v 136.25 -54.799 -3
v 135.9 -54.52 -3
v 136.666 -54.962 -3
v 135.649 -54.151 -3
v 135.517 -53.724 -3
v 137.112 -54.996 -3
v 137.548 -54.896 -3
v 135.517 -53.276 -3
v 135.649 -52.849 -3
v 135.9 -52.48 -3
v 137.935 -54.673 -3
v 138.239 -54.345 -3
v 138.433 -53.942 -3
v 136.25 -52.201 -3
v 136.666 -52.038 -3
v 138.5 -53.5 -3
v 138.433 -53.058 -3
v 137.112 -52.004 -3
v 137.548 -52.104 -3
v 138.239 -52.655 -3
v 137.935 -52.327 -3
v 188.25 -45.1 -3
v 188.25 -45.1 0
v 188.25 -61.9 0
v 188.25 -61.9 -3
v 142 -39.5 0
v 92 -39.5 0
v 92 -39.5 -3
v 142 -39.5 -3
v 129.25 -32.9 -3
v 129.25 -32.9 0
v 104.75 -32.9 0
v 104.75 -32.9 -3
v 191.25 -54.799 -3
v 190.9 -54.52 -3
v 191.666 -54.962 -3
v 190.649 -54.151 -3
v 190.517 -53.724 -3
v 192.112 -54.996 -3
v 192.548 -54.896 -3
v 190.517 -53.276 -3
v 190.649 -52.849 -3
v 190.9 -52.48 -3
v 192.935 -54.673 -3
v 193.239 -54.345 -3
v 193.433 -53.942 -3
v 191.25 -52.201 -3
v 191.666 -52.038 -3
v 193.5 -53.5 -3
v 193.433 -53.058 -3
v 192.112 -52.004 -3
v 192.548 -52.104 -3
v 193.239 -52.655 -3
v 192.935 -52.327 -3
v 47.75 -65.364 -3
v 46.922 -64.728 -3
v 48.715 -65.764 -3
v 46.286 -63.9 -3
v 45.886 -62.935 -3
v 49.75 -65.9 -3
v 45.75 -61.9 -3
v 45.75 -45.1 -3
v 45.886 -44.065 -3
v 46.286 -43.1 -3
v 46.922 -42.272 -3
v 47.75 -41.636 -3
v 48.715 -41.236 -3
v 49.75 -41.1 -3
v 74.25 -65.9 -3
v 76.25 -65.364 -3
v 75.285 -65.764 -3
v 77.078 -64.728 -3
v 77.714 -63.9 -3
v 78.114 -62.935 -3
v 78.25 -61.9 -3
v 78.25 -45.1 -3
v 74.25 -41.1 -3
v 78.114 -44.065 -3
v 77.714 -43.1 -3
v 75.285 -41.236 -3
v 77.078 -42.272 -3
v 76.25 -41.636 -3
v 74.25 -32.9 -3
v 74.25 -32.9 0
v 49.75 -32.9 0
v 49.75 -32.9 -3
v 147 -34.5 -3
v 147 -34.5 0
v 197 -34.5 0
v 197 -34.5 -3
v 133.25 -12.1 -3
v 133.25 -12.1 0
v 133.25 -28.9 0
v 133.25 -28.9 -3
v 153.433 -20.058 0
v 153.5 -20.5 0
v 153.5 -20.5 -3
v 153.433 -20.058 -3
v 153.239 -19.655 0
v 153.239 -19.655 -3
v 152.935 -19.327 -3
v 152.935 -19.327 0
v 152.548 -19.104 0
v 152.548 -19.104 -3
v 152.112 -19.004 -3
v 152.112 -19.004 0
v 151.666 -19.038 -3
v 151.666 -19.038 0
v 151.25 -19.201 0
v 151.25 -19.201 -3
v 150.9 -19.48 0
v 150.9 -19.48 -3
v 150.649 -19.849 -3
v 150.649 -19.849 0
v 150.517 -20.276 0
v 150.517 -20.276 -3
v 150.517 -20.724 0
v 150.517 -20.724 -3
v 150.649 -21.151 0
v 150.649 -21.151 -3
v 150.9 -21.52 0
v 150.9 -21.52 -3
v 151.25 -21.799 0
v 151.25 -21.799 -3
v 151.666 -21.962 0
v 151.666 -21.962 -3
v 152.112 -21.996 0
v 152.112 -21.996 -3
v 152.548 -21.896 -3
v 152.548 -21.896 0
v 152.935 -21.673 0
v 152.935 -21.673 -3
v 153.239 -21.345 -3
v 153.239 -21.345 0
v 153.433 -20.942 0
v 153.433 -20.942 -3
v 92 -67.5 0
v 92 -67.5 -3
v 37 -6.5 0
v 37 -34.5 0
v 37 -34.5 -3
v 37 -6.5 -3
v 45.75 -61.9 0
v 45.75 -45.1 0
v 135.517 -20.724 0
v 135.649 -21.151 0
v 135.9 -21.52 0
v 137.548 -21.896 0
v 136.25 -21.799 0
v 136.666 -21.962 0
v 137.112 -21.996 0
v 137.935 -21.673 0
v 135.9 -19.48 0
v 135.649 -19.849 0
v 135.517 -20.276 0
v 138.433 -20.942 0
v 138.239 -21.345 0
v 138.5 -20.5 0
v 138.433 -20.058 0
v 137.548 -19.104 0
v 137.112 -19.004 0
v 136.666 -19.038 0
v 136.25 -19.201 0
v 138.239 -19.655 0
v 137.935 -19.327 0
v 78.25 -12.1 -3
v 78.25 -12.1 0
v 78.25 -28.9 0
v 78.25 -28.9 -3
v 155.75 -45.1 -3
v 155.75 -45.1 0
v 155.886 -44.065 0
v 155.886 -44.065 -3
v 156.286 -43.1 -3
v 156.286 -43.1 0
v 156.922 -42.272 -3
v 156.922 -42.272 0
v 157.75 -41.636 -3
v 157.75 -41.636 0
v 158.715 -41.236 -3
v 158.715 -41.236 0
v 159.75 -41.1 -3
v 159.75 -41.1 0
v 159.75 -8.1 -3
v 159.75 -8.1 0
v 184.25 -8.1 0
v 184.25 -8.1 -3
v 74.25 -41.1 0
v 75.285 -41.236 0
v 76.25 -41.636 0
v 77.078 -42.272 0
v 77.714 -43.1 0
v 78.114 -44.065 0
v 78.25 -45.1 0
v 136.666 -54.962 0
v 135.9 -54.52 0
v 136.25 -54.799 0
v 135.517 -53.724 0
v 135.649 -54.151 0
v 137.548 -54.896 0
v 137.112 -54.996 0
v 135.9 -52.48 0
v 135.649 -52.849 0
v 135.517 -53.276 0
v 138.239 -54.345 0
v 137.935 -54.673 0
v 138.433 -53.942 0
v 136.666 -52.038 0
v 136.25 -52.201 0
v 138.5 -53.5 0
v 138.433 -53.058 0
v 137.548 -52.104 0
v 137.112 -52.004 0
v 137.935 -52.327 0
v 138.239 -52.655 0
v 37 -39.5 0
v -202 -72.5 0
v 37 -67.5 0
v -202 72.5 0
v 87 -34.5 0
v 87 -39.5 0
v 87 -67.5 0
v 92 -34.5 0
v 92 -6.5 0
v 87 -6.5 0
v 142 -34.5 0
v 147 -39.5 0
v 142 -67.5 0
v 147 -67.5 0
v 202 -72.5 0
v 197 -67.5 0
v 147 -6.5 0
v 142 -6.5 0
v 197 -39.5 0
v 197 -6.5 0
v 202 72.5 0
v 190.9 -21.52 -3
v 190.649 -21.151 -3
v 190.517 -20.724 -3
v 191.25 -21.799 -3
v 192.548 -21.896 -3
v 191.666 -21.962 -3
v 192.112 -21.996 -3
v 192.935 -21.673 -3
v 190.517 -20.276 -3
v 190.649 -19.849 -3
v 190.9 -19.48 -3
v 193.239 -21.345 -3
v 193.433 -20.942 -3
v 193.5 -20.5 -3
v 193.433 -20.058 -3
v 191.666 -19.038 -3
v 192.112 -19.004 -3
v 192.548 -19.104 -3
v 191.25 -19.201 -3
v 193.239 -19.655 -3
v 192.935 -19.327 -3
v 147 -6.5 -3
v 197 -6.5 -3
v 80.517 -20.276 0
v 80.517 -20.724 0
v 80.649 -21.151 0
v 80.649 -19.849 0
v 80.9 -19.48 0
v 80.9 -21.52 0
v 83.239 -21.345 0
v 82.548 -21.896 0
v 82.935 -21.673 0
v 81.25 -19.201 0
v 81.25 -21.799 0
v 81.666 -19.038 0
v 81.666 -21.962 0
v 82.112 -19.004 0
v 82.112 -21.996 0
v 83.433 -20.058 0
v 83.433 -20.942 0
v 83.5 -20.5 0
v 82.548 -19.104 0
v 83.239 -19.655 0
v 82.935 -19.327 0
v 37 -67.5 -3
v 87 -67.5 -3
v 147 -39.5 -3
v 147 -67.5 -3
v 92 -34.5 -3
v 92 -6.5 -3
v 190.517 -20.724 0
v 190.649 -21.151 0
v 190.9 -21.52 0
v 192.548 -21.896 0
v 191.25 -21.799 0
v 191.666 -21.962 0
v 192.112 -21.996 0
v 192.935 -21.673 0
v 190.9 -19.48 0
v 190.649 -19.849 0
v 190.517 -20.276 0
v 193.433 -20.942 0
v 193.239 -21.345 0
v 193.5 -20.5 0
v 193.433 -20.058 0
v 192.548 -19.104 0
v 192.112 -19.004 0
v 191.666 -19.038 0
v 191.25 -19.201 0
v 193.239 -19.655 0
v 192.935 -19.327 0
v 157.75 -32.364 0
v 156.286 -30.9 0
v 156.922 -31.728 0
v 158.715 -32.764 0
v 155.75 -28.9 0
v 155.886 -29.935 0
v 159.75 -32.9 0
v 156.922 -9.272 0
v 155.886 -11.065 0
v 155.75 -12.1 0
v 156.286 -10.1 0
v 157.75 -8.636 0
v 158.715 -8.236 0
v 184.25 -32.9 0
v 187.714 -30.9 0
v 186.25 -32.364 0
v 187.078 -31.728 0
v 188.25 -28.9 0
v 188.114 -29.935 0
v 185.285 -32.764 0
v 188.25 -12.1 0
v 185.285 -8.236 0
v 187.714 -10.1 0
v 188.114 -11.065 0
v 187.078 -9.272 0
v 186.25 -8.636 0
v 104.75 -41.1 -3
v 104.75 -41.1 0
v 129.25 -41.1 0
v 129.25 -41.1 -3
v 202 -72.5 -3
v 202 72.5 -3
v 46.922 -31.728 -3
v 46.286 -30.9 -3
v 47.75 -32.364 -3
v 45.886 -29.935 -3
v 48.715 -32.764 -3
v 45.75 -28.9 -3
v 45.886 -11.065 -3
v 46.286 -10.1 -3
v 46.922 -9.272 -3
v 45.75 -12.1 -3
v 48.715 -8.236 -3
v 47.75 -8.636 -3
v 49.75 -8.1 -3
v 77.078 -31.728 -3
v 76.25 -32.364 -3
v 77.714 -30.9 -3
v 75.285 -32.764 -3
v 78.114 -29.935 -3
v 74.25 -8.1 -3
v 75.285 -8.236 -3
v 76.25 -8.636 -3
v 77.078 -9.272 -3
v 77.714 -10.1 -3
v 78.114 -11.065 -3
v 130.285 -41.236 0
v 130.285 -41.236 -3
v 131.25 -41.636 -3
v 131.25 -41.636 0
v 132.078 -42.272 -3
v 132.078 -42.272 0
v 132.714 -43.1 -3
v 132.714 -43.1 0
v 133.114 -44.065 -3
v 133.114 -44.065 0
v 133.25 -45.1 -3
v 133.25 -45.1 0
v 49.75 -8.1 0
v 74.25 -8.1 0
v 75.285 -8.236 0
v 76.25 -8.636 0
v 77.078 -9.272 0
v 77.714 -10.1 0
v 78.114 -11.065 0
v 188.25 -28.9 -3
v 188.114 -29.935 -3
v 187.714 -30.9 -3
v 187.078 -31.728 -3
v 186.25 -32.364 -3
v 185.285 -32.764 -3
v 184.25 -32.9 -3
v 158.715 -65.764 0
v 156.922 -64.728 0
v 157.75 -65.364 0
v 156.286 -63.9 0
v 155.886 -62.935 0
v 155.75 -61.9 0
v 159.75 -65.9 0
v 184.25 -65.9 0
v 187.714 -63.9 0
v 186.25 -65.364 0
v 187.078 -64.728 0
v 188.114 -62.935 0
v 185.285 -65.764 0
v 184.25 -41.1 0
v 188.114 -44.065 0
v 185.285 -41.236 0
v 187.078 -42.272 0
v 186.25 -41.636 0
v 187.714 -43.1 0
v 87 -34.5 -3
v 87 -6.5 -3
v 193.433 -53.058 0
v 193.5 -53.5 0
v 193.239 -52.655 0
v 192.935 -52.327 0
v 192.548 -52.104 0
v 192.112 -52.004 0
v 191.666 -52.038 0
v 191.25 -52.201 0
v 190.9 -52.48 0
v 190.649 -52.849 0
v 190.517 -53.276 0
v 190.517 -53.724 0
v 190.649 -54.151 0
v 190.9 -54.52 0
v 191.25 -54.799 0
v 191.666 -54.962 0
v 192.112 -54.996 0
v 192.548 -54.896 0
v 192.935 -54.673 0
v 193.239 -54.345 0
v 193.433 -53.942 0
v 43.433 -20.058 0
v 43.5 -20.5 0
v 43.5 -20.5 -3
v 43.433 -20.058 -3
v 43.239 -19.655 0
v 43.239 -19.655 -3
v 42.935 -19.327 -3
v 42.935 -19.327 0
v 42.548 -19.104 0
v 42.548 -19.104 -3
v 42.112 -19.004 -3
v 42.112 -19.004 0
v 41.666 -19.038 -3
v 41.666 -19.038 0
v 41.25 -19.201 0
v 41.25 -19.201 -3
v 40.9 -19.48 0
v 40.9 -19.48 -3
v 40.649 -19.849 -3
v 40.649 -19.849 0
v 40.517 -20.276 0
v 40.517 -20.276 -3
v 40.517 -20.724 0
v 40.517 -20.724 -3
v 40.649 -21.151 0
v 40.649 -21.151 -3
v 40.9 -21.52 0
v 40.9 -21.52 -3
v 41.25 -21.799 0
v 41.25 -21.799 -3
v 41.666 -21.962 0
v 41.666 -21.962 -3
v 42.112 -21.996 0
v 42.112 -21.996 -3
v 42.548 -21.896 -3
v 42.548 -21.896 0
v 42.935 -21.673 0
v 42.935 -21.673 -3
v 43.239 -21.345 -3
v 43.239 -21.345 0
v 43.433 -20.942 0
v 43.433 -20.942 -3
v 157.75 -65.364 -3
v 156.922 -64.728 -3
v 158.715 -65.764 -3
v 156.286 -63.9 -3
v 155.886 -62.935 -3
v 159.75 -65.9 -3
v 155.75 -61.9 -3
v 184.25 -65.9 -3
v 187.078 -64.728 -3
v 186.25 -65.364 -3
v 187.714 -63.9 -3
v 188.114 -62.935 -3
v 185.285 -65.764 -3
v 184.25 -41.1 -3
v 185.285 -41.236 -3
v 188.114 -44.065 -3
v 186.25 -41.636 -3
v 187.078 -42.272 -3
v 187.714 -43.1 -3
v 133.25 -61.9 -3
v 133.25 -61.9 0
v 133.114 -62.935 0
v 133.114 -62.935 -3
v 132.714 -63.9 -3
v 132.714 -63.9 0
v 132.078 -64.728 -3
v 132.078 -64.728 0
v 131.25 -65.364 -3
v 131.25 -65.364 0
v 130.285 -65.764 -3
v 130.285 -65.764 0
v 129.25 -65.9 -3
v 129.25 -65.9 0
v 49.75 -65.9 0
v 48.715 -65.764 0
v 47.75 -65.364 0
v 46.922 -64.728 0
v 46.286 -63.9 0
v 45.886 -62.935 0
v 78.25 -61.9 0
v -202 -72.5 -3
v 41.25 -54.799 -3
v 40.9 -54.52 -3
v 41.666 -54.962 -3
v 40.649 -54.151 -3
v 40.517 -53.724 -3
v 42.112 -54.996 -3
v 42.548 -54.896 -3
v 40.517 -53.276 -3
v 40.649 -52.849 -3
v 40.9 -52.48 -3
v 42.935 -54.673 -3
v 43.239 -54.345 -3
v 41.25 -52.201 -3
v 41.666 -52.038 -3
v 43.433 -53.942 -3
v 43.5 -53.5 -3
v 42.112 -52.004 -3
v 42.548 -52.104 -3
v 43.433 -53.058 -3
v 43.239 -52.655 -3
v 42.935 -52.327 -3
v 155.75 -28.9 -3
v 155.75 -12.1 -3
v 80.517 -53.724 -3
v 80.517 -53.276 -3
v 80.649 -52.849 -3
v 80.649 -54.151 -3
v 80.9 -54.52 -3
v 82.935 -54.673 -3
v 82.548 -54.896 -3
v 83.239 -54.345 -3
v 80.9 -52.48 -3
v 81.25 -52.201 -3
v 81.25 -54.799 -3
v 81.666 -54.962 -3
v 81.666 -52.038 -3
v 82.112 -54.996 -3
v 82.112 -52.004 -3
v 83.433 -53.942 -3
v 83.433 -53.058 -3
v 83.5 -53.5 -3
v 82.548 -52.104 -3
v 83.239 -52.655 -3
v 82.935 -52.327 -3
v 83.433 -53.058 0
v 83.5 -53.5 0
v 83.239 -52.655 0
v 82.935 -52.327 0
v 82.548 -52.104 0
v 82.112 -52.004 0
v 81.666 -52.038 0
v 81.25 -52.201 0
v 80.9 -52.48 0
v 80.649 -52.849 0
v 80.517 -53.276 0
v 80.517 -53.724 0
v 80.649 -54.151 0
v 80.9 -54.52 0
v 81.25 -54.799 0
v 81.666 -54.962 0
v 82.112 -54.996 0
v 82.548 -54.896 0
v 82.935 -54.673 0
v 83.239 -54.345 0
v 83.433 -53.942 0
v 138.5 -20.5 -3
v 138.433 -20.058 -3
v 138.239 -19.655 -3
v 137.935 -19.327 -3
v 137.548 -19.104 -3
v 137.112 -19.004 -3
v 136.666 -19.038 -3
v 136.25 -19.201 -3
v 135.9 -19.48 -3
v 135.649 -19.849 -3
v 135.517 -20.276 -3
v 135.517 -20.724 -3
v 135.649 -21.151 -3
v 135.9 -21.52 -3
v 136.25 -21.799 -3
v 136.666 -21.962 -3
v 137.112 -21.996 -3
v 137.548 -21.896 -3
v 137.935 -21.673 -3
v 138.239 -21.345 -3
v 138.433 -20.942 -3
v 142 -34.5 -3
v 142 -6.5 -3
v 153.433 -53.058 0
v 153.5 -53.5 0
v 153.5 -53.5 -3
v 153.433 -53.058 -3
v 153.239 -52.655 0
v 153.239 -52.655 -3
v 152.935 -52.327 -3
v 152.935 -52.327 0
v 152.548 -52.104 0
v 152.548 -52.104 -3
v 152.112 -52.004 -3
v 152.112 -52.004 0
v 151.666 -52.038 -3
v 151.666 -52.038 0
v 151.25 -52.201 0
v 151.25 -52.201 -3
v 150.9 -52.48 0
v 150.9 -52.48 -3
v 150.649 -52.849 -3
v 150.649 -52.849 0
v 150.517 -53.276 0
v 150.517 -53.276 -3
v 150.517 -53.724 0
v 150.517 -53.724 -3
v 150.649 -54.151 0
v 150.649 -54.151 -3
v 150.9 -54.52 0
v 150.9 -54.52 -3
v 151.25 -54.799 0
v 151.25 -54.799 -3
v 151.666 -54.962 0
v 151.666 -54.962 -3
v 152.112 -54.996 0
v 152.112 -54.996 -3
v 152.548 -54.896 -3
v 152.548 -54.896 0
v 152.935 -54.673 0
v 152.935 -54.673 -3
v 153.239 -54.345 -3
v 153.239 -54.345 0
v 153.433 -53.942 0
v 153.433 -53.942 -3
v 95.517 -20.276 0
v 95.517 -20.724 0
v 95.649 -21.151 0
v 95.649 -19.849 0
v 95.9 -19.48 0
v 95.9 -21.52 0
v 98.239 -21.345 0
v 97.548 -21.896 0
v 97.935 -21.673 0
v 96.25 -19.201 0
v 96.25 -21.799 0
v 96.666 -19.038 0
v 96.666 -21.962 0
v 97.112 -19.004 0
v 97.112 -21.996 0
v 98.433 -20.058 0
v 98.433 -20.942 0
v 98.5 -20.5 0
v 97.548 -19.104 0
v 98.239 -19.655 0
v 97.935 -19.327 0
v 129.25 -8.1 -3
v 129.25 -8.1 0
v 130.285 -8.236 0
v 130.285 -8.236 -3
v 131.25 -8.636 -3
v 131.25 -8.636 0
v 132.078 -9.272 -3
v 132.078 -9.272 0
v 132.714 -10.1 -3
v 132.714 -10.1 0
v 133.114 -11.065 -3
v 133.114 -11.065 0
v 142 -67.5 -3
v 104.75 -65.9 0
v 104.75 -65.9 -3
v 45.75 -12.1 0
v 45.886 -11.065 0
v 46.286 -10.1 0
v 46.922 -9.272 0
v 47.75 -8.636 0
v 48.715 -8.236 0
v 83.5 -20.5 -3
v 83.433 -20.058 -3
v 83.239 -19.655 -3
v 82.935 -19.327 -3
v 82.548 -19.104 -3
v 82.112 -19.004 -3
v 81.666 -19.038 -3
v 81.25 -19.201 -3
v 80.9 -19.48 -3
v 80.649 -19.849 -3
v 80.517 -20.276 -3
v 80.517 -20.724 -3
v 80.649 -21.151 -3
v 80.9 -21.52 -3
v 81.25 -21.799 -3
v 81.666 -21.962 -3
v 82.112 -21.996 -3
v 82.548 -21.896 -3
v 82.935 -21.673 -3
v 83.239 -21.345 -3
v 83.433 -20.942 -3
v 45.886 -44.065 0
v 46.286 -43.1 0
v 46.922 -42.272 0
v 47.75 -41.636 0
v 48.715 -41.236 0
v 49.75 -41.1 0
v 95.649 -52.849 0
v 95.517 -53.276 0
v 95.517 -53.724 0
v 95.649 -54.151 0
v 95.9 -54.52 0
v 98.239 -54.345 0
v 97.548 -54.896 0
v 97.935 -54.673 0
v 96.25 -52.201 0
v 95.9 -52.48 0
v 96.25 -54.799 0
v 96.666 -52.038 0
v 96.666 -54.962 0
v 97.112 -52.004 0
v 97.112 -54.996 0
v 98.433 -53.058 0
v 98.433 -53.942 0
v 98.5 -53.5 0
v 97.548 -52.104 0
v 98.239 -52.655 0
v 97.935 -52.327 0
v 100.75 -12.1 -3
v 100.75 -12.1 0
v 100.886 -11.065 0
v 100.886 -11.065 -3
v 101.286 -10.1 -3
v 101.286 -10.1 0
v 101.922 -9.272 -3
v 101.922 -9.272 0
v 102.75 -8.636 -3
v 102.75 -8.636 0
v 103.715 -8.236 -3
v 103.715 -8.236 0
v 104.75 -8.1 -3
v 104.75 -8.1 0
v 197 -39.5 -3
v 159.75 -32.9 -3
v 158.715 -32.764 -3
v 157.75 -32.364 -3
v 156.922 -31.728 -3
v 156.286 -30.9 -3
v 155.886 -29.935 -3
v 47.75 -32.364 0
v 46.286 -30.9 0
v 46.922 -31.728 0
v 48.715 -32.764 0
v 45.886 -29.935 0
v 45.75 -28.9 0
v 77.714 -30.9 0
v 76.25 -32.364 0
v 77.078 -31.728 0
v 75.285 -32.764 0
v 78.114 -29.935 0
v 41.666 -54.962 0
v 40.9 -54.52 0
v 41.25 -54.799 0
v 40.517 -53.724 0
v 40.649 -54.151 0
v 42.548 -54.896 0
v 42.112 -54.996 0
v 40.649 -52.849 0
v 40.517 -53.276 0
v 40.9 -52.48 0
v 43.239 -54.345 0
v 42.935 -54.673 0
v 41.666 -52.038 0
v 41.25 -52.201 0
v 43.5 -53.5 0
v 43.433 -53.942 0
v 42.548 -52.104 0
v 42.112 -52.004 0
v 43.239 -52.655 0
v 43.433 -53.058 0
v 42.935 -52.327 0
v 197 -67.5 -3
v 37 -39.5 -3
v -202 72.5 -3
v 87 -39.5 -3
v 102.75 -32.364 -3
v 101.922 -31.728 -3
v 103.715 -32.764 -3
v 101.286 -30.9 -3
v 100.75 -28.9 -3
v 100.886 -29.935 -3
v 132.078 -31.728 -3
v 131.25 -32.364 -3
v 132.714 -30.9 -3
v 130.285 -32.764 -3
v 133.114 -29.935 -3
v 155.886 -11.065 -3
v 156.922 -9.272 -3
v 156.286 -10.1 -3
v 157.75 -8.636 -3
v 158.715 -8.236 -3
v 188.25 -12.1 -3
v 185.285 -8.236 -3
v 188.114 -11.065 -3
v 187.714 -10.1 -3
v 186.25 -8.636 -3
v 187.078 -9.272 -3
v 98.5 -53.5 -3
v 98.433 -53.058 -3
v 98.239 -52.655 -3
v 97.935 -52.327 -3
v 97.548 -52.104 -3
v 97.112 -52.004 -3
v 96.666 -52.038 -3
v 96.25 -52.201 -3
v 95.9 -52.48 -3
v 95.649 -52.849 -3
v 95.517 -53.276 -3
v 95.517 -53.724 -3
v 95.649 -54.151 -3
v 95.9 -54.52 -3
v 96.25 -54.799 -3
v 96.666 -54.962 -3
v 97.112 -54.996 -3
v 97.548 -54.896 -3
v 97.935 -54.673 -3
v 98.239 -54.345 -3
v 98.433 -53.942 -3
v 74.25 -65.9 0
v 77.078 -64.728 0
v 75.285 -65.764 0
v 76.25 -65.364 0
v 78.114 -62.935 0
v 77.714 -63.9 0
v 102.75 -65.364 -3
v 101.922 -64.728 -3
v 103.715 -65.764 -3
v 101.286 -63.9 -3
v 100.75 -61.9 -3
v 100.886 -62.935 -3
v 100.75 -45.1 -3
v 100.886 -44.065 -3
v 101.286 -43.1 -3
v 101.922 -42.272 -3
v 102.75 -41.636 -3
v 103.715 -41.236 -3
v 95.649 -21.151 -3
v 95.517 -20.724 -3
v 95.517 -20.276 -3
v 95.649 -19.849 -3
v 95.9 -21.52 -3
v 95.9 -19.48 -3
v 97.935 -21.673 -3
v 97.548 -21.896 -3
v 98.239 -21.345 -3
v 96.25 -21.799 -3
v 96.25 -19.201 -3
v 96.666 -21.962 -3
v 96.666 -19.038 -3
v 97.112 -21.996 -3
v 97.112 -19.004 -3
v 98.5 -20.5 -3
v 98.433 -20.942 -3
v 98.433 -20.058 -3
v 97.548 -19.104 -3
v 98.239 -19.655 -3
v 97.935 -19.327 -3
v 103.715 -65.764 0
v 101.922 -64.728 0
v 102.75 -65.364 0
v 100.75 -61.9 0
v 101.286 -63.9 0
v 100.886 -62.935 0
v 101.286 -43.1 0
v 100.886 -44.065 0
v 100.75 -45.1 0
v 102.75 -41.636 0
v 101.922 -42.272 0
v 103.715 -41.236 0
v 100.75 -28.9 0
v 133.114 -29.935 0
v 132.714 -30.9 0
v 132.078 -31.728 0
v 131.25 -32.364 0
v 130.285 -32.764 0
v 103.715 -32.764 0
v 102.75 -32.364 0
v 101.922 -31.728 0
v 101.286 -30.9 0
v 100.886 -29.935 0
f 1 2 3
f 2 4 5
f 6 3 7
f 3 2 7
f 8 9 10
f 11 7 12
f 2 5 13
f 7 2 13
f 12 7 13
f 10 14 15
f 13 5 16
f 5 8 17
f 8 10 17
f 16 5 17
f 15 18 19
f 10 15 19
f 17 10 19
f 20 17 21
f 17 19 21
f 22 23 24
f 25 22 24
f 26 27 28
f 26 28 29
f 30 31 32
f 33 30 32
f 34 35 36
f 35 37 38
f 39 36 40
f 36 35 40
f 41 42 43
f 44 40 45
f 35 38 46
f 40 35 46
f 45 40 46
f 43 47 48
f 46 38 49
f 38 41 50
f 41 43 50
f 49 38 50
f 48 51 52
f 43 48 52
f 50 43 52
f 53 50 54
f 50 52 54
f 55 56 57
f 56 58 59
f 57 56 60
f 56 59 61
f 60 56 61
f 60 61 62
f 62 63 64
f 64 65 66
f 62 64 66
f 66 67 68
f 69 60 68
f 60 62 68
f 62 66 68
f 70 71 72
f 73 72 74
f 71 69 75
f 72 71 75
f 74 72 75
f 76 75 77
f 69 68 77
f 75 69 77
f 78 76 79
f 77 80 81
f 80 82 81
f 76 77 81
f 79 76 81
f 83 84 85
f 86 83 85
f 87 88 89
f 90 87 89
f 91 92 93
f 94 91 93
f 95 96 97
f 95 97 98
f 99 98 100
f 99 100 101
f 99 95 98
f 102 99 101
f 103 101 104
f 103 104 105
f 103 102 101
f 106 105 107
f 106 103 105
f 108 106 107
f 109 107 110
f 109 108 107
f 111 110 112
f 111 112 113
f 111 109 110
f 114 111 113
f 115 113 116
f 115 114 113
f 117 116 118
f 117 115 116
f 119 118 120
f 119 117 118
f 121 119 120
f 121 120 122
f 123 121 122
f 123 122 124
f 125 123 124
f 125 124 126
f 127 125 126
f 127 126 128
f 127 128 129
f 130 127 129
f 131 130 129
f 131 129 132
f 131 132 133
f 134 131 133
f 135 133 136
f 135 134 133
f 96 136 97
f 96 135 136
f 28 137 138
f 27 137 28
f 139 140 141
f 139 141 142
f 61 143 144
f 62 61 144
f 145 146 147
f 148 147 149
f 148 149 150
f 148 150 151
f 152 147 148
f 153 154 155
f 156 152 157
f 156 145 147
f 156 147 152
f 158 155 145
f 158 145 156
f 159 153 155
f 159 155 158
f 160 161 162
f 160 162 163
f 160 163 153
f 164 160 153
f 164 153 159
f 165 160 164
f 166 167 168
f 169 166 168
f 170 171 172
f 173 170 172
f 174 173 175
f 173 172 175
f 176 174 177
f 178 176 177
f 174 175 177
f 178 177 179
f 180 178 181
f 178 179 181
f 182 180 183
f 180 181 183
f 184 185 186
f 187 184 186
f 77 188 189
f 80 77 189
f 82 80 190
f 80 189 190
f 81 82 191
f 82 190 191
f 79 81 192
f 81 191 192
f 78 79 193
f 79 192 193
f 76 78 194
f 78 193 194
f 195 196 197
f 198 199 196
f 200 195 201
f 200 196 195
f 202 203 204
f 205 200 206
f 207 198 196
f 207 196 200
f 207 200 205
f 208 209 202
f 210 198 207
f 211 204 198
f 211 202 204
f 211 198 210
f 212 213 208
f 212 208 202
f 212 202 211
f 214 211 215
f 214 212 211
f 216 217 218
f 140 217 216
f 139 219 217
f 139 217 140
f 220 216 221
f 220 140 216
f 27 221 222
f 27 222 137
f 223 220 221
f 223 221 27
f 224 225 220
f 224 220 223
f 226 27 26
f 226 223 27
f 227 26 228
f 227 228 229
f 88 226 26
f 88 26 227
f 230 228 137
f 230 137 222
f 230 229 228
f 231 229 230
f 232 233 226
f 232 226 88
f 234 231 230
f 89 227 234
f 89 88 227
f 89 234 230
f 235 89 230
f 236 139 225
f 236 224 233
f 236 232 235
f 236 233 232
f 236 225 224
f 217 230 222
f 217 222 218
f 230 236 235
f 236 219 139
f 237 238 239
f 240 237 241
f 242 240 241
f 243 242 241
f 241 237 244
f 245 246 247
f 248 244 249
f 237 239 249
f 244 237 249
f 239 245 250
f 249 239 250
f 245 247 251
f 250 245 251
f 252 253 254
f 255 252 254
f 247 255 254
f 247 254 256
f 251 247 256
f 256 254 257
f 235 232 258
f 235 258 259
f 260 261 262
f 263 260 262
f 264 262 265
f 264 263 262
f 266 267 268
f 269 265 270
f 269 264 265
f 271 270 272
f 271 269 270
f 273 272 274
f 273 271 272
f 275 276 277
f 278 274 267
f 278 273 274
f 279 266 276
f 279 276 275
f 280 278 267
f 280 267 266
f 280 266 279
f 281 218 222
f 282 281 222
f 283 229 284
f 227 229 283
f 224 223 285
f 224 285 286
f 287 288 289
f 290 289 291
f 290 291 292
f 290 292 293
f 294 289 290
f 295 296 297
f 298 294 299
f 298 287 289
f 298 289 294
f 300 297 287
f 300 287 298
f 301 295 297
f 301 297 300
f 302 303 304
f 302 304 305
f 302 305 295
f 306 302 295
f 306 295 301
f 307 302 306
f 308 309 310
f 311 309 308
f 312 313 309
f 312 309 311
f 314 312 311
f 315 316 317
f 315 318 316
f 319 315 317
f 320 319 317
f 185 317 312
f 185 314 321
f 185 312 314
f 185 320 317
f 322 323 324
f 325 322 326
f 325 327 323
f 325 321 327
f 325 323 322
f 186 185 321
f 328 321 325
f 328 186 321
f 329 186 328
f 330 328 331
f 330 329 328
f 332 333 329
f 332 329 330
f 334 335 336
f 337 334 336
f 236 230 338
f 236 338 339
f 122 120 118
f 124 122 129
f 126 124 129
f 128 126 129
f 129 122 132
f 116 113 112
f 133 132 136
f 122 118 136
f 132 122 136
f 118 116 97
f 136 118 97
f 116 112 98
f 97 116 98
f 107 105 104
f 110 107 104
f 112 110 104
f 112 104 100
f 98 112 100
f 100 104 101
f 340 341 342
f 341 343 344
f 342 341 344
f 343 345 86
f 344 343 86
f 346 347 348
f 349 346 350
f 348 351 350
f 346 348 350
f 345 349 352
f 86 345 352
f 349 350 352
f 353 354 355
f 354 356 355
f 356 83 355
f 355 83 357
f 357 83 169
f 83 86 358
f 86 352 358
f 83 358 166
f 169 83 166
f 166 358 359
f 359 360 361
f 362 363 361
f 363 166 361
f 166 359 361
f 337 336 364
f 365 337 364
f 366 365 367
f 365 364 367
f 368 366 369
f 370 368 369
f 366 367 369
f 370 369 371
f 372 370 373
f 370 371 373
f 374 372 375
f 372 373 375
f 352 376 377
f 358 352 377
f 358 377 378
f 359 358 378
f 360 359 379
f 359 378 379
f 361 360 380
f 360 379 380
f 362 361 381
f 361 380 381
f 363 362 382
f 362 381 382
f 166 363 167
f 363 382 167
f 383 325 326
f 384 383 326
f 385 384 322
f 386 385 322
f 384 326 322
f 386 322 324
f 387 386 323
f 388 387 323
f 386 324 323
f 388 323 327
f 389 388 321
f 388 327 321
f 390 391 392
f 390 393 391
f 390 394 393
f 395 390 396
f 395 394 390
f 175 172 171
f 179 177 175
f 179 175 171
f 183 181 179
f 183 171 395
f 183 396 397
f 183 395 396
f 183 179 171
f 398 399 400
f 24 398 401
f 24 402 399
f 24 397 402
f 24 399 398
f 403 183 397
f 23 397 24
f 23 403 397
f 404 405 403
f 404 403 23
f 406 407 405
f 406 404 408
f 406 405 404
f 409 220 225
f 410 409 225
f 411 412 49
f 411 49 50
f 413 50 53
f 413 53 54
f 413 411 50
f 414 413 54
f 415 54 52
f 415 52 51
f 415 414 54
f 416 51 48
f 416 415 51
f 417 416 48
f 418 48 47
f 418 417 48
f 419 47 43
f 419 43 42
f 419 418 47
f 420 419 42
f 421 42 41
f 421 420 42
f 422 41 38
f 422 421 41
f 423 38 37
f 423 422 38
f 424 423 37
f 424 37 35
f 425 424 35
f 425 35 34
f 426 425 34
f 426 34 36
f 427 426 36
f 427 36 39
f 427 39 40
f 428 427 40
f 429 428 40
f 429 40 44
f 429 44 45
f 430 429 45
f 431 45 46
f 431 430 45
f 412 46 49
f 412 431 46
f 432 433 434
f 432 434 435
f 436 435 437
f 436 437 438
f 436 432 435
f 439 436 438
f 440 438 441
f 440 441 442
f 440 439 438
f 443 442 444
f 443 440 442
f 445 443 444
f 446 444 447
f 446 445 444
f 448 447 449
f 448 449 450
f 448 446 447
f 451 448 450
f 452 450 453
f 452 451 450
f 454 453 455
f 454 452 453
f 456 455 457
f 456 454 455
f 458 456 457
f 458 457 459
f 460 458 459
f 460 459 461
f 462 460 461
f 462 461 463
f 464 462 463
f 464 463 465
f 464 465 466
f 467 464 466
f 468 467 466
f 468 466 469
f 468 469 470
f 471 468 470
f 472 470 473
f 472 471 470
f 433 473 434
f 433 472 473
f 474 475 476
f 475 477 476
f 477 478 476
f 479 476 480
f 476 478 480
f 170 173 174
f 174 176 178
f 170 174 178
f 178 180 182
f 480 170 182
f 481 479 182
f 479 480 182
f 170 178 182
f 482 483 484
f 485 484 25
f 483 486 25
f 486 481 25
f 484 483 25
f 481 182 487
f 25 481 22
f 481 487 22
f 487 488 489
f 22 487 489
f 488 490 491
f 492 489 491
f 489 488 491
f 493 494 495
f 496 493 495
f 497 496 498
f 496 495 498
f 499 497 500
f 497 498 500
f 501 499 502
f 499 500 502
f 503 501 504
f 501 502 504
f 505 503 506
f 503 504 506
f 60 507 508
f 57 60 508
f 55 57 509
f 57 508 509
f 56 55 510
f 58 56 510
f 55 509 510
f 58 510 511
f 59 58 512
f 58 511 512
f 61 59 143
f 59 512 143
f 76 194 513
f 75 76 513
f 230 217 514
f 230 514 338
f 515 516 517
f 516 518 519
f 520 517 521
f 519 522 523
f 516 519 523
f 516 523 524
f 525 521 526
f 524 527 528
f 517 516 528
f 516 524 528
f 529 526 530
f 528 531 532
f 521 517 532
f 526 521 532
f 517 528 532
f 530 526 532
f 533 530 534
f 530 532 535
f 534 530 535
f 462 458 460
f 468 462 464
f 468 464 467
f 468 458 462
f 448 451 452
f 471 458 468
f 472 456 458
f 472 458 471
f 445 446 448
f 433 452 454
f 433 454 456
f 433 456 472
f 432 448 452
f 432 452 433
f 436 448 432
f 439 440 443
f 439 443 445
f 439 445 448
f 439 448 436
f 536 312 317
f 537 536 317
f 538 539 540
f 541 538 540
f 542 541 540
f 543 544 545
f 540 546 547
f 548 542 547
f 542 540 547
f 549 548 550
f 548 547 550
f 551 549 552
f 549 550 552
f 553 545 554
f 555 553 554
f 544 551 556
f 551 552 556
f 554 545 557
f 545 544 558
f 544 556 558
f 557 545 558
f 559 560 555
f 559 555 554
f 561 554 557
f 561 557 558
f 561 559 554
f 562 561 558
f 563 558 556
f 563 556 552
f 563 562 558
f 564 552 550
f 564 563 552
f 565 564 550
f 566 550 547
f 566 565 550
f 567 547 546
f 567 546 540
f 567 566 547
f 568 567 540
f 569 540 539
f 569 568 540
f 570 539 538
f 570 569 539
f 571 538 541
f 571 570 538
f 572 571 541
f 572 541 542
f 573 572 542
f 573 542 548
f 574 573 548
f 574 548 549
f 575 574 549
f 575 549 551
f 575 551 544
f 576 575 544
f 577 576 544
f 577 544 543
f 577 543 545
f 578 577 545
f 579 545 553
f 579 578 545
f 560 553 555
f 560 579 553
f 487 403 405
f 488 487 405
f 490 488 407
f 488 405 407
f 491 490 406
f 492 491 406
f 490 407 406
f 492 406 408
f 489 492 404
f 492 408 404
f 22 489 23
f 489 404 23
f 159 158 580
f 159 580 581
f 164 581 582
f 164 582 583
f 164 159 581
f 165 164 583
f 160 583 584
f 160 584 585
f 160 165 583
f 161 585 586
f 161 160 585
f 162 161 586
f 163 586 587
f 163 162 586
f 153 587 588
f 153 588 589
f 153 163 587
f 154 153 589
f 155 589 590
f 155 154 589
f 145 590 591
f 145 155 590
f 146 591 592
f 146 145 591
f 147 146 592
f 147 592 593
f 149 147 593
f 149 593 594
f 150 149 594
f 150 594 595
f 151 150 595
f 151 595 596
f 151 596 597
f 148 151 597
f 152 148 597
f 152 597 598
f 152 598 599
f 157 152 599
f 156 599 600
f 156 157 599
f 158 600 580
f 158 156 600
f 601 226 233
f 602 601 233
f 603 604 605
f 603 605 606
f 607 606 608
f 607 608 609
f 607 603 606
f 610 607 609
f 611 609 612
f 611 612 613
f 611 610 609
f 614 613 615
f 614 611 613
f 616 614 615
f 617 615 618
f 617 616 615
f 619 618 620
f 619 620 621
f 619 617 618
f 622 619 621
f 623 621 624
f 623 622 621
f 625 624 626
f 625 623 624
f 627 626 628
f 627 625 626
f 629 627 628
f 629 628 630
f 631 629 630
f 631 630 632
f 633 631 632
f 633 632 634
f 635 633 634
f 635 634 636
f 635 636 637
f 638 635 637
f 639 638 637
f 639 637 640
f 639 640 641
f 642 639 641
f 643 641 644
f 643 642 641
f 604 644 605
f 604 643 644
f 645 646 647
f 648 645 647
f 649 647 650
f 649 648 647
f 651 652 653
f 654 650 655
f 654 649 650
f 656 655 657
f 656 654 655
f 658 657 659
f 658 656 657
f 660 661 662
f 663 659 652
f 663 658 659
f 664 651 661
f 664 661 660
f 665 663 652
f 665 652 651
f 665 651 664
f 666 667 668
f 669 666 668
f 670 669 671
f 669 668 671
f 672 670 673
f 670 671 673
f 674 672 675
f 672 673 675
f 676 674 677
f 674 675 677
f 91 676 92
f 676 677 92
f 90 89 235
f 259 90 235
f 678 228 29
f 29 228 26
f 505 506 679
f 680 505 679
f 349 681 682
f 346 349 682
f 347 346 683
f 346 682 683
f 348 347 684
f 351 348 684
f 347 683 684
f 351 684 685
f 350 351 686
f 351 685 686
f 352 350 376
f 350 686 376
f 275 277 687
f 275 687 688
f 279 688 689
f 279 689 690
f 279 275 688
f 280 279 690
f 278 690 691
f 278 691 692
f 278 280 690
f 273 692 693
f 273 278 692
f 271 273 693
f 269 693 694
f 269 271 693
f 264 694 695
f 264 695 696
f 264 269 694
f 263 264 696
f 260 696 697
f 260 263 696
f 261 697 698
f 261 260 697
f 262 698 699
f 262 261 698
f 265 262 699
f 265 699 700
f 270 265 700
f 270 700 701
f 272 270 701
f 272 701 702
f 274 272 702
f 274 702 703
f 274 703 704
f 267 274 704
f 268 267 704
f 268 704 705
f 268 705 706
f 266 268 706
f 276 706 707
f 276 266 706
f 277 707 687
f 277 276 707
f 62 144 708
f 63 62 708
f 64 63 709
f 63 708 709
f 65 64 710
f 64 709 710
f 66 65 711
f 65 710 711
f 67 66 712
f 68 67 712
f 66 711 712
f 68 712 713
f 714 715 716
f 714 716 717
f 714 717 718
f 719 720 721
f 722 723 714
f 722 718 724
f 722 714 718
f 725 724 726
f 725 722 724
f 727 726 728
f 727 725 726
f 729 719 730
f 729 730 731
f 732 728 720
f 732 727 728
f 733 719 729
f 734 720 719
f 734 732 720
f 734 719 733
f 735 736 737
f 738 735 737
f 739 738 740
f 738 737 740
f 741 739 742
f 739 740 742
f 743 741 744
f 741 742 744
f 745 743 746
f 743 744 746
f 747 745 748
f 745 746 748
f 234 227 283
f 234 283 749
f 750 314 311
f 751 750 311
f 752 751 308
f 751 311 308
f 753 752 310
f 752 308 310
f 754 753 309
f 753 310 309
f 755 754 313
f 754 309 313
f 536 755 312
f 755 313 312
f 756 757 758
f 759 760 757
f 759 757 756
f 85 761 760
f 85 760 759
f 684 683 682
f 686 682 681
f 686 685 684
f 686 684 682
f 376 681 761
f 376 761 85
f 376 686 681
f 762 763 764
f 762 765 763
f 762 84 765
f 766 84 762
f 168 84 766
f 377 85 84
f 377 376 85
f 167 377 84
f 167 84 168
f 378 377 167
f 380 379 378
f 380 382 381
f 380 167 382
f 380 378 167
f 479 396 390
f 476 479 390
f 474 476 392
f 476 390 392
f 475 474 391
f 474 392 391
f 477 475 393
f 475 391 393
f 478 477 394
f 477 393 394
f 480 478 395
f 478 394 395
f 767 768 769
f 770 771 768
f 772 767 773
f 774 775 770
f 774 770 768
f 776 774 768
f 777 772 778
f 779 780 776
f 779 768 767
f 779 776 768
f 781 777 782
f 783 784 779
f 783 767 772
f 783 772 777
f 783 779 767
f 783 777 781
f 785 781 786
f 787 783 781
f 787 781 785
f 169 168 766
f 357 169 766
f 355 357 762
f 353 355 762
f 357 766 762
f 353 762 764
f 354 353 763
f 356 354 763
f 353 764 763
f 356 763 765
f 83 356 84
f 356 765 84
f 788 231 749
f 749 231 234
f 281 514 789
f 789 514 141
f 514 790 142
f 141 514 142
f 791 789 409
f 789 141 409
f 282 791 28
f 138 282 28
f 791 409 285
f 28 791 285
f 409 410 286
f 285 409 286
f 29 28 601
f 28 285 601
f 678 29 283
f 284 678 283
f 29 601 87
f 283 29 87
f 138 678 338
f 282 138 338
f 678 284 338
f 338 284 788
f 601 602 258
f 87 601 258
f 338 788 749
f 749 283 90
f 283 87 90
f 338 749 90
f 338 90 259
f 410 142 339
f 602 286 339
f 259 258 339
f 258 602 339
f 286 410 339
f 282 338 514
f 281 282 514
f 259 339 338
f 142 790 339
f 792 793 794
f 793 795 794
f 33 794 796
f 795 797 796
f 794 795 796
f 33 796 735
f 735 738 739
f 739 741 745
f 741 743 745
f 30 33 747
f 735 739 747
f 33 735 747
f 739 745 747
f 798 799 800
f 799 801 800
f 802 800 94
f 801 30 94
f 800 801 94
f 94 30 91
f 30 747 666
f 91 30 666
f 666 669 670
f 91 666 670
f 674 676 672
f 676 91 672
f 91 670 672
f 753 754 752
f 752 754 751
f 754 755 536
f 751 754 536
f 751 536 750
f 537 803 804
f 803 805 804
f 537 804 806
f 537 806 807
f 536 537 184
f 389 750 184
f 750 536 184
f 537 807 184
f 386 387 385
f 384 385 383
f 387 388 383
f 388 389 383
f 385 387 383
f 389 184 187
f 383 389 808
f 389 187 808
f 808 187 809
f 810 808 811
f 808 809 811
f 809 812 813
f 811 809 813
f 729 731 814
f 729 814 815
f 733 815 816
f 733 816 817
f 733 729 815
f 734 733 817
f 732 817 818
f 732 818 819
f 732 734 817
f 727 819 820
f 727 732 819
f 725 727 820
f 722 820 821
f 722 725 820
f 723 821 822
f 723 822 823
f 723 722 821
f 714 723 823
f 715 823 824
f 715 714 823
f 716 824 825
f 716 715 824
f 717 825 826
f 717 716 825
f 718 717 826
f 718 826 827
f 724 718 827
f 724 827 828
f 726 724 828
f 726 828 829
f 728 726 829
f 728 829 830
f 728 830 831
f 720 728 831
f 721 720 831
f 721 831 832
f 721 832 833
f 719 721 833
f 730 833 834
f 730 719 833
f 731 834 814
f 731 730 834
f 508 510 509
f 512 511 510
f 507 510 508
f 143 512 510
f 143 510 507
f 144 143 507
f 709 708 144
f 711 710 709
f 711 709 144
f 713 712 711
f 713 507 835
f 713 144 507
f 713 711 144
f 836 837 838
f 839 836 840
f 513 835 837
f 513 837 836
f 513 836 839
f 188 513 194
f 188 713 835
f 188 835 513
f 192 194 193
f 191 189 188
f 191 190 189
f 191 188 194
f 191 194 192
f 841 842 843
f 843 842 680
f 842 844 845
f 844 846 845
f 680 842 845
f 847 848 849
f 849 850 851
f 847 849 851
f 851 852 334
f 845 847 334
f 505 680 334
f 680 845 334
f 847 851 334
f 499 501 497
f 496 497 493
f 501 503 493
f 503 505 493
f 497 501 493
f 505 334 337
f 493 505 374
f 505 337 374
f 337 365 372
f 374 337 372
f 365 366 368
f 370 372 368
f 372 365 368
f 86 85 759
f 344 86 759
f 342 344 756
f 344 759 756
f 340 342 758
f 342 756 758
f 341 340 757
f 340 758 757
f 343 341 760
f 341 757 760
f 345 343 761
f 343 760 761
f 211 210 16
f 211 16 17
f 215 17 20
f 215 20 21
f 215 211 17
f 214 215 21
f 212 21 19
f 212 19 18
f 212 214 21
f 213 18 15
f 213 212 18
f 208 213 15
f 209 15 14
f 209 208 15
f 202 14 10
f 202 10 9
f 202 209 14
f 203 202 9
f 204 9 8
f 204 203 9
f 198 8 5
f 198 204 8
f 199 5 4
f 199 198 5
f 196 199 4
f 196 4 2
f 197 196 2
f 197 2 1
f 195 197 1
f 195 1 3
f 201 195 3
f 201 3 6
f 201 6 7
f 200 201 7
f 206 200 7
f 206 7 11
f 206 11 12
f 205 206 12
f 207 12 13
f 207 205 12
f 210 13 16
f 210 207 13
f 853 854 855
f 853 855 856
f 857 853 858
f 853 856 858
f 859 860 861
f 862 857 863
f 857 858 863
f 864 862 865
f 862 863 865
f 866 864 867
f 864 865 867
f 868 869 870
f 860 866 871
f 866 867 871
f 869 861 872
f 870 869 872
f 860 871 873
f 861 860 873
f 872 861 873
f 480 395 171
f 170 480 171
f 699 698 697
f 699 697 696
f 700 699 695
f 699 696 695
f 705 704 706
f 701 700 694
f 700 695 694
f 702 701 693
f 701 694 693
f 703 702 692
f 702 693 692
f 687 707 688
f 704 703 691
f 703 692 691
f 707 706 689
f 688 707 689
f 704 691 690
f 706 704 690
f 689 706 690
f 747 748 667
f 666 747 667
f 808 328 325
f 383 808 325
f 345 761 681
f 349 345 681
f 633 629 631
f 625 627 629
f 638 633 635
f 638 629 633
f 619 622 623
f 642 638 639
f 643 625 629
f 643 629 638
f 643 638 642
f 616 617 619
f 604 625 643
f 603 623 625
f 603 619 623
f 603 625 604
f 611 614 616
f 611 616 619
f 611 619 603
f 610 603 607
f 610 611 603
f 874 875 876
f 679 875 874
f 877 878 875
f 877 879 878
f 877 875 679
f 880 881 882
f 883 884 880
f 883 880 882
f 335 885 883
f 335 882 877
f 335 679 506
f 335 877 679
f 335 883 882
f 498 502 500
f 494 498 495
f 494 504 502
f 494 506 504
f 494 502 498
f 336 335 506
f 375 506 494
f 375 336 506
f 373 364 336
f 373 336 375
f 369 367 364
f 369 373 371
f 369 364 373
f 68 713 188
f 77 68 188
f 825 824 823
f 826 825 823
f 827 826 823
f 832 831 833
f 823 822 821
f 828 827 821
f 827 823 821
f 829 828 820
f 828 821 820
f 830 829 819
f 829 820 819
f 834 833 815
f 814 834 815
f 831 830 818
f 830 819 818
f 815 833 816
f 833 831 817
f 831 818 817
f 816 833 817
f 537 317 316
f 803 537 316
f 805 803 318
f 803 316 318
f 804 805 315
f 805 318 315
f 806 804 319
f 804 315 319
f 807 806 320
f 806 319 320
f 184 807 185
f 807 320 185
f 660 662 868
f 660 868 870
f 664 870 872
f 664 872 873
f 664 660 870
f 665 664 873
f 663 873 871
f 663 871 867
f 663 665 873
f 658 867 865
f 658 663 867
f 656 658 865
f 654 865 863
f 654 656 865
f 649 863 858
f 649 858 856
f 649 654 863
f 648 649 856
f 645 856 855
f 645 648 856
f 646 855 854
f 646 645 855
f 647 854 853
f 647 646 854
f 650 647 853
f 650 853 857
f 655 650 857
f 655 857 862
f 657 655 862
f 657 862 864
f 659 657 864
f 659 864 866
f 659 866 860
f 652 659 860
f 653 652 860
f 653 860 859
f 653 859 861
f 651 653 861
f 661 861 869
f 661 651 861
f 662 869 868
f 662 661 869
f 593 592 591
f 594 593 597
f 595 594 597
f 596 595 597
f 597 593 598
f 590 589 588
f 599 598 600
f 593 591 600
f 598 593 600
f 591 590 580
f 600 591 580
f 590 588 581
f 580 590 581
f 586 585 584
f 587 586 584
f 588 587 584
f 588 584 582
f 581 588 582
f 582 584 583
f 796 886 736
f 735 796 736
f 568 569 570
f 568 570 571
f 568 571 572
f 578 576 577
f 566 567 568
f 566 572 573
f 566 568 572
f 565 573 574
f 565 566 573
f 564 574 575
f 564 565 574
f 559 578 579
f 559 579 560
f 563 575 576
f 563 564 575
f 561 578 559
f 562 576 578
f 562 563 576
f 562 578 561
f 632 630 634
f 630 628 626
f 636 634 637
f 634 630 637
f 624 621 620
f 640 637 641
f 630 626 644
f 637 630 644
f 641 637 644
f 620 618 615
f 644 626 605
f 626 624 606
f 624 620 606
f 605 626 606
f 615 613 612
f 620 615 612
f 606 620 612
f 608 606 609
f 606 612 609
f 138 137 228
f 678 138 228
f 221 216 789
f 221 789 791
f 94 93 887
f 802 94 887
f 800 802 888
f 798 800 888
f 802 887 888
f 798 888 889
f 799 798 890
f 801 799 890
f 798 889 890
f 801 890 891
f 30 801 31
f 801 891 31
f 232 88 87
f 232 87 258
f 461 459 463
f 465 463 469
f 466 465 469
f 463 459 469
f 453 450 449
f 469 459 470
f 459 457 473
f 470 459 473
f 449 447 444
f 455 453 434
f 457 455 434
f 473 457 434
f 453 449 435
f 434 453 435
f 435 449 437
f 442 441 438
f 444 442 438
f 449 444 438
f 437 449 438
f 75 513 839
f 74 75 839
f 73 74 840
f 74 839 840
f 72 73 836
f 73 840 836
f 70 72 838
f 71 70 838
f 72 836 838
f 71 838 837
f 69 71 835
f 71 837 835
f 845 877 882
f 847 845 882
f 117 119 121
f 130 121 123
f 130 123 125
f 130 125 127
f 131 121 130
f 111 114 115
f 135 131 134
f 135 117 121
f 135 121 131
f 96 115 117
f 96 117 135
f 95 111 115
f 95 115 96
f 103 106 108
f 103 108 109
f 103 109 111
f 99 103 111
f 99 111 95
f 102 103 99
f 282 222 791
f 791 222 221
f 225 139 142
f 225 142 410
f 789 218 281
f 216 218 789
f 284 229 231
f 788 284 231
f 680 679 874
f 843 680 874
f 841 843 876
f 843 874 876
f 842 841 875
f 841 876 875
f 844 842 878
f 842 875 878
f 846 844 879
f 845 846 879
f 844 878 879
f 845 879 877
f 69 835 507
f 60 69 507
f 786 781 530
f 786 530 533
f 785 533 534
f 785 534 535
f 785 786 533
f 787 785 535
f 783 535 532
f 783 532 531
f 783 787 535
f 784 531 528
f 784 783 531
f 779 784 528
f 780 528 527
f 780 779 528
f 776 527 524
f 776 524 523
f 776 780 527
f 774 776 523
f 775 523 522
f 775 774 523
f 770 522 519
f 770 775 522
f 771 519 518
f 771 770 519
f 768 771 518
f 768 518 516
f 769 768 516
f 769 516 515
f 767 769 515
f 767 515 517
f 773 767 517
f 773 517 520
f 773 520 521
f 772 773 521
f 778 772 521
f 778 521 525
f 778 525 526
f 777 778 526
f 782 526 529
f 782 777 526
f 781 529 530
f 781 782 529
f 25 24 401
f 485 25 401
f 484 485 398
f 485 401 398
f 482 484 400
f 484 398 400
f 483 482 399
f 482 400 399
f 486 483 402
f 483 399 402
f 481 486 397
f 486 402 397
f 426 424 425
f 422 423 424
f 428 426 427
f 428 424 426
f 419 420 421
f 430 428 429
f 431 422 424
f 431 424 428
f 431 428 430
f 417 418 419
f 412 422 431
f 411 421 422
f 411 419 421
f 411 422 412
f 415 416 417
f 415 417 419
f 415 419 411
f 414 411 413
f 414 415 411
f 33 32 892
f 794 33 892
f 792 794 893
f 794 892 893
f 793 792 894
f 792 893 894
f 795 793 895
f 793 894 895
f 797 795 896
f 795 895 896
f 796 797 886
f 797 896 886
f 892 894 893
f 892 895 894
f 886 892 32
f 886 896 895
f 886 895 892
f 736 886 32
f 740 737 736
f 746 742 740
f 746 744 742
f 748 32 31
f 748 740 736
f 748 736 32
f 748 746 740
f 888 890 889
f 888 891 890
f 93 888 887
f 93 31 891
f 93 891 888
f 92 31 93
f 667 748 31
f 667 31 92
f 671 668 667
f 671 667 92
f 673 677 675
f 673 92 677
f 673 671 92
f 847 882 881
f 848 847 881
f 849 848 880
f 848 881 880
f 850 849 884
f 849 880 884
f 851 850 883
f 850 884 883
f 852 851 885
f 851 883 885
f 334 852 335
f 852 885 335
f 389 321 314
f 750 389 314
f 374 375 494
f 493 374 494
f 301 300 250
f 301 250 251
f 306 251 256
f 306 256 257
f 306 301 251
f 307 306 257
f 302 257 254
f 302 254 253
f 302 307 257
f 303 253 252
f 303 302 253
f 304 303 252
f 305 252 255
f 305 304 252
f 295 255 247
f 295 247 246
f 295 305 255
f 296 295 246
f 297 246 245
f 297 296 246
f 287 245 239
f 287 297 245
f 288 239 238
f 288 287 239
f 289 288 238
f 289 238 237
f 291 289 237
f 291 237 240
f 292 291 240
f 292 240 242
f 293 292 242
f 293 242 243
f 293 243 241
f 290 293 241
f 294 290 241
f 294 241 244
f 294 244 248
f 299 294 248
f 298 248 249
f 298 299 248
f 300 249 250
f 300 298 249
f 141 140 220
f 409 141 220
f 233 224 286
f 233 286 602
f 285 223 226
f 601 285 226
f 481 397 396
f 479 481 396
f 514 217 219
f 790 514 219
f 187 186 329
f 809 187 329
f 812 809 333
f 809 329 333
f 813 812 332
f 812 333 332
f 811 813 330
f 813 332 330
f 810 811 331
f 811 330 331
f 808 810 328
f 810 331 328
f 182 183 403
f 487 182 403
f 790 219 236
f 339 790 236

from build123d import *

# Parameters (mm, degrees)
F0_W     = 404
F0_H     = 145
F2_DEPTH = 3
F1_W     = 50
F1_H     = 28
F1_R     = 1.5
F3_DEPTH = 3


with BuildPart() as f2:
    # F0 (on Top) → F2 (new body)
    with BuildSketch(Plane.XY):
        Rectangle(F0_W, F0_H)
    extrude(amount=-F2_DEPTH)

    # F1 (on Top) → F3 (cut, through all)
    with BuildSketch(Plane.XY):
        with Locations((172, -53.5)):
            Rectangle(F1_W, F1_H)
        with Locations((152, -53.5)):
            Circle(F1_R, mode=Mode.SUBTRACT)
        with BuildLine():
            ThreePointArc((188.25, -61.9), (187.078427, -64.728427), (184.25, -65.9))
            Line((184.25, -65.9), (159.75, -65.9))
            ThreePointArc((159.75, -65.9), (156.921573, -64.728427), (155.75, -61.9))
            Line((155.75, -61.9), (155.75, -45.1))
            ThreePointArc((155.75, -45.1), (156.921573, -42.271573), (159.75, -41.1))
            Line((159.75, -41.1), (184.25, -41.1))
            ThreePointArc((184.25, -41.1), (187.078427, -42.271573), (188.25, -45.1))
            Line((188.25, -45.1), (188.25, -61.9))
        make_face(mode=Mode.SUBTRACT)
        with Locations((192, -53.5)):
            Circle(F1_R, mode=Mode.SUBTRACT)
        with Locations((117, -53.5)):
            Rectangle(F1_W, F1_H)
        with Locations((97, -53.5)):
            Circle(F1_R, mode=Mode.SUBTRACT)
        with BuildLine():
            ThreePointArc((133.25, -61.9), (132.078427, -64.728427), (129.25, -65.9))
            Line((129.25, -65.9), (104.75, -65.9))
            ThreePointArc((104.75, -65.9), (101.921573, -64.728427), (100.75, -61.9))
            Line((100.75, -61.9), (100.75, -45.1))
            ThreePointArc((100.75, -45.1), (101.921573, -42.271573), (104.75, -41.1))
            Line((104.75, -41.1), (129.25, -41.1))
            ThreePointArc((129.25, -41.1), (132.078427, -42.271573), (133.25, -45.1))
            Line((133.25, -45.1), (133.25, -61.9))
        make_face(mode=Mode.SUBTRACT)
        with Locations((137, -53.5)):
            Circle(F1_R, mode=Mode.SUBTRACT)
        with Locations((172, -20.5)):
            Rectangle(F1_W, F1_H)
        with Locations((152, -20.5)):
            Circle(F1_R, mode=Mode.SUBTRACT)
        with BuildLine():
            ThreePointArc((188.25, -28.9), (187.078427, -31.728427), (184.25, -32.9))
            Line((184.25, -32.9), (159.75, -32.9))
            ThreePointArc((159.75, -32.9), (156.921573, -31.728427), (155.75, -28.9))
            Line((155.75, -28.9), (155.75, -12.1))
            ThreePointArc((155.75, -12.1), (156.921573, -9.271573), (159.75, -8.1))
            Line((159.75, -8.1), (184.25, -8.1))
            ThreePointArc((184.25, -8.1), (187.078427, -9.271573), (188.25, -12.1))
            Line((188.25, -12.1), (188.25, -28.9))
        make_face(mode=Mode.SUBTRACT)
        with Locations((192, -20.5)):
            Circle(F1_R, mode=Mode.SUBTRACT)
        with Locations((117, -20.5)):
            Rectangle(F1_W, F1_H)
        with Locations((97, -20.5)):
            Circle(F1_R, mode=Mode.SUBTRACT)
        with BuildLine():
            ThreePointArc((133.25, -28.9), (132.078427, -31.728427), (129.25, -32.9))
            Line((129.25, -32.9), (104.75, -32.9))
            ThreePointArc((104.75, -32.9), (101.921573, -31.728427), (100.75, -28.9))
            Line((100.75, -28.9), (100.75, -12.1))
            ThreePointArc((100.75, -12.1), (101.921573, -9.271573), (104.75, -8.1))
            Line((104.75, -8.1), (129.25, -8.1))
            ThreePointArc((129.25, -8.1), (132.078427, -9.271573), (133.25, -12.1))
            Line((133.25, -12.1), (133.25, -28.9))
        make_face(mode=Mode.SUBTRACT)
        with Locations((137, -20.5)):
            Circle(F1_R, mode=Mode.SUBTRACT)
        with Locations((62, -53.5)):
            Rectangle(F1_W, F1_H)
        with Locations((42, -53.5)):
            Circle(F1_R, mode=Mode.SUBTRACT)
        with BuildLine():
            ThreePointArc((78.25, -61.9), (77.078427, -64.728427), (74.25, -65.9))
            Line((74.25, -65.9), (49.75, -65.9))
            ThreePointArc((49.75, -65.9), (46.921573, -64.728427), (45.75, -61.9))
            Line((45.75, -61.9), (45.75, -45.1))
            ThreePointArc((45.75, -45.1), (46.921573, -42.271573), (49.75, -41.1))
            Line((49.75, -41.1), (74.25, -41.1))
            ThreePointArc((74.25, -41.1), (77.078427, -42.271573), (78.25, -45.1))
            Line((78.25, -45.1), (78.25, -61.9))
        make_face(mode=Mode.SUBTRACT)
        with Locations((82, -53.5)):
            Circle(F1_R, mode=Mode.SUBTRACT)
        with Locations((62, -20.5)):
            Rectangle(F1_W, F1_H)
        with Locations((42, -20.5)):
            Circle(F1_R, mode=Mode.SUBTRACT)
        with BuildLine():
            ThreePointArc((78.25, -28.9), (77.078427, -31.728427), (74.25, -32.9))
            Line((74.25, -32.9), (49.75, -32.9))
            ThreePointArc((49.75, -32.9), (46.921573, -31.728427), (45.75, -28.9))
            Line((45.75, -28.9), (45.75, -12.1))
            ThreePointArc((45.75, -12.1), (46.921573, -9.271573), (49.75, -8.1))
            Line((49.75, -8.1), (74.25, -8.1))
            ThreePointArc((74.25, -8.1), (77.078427, -9.271573), (78.25, -12.1))
            Line((78.25, -12.1), (78.25, -28.9))
        make_face(mode=Mode.SUBTRACT)
        with Locations((82, -20.5)):
            Circle(F1_R, mode=Mode.SUBTRACT)
    extrude(amount=-F3_DEPTH, mode=Mode.SUBTRACT)


solid = f2.part
